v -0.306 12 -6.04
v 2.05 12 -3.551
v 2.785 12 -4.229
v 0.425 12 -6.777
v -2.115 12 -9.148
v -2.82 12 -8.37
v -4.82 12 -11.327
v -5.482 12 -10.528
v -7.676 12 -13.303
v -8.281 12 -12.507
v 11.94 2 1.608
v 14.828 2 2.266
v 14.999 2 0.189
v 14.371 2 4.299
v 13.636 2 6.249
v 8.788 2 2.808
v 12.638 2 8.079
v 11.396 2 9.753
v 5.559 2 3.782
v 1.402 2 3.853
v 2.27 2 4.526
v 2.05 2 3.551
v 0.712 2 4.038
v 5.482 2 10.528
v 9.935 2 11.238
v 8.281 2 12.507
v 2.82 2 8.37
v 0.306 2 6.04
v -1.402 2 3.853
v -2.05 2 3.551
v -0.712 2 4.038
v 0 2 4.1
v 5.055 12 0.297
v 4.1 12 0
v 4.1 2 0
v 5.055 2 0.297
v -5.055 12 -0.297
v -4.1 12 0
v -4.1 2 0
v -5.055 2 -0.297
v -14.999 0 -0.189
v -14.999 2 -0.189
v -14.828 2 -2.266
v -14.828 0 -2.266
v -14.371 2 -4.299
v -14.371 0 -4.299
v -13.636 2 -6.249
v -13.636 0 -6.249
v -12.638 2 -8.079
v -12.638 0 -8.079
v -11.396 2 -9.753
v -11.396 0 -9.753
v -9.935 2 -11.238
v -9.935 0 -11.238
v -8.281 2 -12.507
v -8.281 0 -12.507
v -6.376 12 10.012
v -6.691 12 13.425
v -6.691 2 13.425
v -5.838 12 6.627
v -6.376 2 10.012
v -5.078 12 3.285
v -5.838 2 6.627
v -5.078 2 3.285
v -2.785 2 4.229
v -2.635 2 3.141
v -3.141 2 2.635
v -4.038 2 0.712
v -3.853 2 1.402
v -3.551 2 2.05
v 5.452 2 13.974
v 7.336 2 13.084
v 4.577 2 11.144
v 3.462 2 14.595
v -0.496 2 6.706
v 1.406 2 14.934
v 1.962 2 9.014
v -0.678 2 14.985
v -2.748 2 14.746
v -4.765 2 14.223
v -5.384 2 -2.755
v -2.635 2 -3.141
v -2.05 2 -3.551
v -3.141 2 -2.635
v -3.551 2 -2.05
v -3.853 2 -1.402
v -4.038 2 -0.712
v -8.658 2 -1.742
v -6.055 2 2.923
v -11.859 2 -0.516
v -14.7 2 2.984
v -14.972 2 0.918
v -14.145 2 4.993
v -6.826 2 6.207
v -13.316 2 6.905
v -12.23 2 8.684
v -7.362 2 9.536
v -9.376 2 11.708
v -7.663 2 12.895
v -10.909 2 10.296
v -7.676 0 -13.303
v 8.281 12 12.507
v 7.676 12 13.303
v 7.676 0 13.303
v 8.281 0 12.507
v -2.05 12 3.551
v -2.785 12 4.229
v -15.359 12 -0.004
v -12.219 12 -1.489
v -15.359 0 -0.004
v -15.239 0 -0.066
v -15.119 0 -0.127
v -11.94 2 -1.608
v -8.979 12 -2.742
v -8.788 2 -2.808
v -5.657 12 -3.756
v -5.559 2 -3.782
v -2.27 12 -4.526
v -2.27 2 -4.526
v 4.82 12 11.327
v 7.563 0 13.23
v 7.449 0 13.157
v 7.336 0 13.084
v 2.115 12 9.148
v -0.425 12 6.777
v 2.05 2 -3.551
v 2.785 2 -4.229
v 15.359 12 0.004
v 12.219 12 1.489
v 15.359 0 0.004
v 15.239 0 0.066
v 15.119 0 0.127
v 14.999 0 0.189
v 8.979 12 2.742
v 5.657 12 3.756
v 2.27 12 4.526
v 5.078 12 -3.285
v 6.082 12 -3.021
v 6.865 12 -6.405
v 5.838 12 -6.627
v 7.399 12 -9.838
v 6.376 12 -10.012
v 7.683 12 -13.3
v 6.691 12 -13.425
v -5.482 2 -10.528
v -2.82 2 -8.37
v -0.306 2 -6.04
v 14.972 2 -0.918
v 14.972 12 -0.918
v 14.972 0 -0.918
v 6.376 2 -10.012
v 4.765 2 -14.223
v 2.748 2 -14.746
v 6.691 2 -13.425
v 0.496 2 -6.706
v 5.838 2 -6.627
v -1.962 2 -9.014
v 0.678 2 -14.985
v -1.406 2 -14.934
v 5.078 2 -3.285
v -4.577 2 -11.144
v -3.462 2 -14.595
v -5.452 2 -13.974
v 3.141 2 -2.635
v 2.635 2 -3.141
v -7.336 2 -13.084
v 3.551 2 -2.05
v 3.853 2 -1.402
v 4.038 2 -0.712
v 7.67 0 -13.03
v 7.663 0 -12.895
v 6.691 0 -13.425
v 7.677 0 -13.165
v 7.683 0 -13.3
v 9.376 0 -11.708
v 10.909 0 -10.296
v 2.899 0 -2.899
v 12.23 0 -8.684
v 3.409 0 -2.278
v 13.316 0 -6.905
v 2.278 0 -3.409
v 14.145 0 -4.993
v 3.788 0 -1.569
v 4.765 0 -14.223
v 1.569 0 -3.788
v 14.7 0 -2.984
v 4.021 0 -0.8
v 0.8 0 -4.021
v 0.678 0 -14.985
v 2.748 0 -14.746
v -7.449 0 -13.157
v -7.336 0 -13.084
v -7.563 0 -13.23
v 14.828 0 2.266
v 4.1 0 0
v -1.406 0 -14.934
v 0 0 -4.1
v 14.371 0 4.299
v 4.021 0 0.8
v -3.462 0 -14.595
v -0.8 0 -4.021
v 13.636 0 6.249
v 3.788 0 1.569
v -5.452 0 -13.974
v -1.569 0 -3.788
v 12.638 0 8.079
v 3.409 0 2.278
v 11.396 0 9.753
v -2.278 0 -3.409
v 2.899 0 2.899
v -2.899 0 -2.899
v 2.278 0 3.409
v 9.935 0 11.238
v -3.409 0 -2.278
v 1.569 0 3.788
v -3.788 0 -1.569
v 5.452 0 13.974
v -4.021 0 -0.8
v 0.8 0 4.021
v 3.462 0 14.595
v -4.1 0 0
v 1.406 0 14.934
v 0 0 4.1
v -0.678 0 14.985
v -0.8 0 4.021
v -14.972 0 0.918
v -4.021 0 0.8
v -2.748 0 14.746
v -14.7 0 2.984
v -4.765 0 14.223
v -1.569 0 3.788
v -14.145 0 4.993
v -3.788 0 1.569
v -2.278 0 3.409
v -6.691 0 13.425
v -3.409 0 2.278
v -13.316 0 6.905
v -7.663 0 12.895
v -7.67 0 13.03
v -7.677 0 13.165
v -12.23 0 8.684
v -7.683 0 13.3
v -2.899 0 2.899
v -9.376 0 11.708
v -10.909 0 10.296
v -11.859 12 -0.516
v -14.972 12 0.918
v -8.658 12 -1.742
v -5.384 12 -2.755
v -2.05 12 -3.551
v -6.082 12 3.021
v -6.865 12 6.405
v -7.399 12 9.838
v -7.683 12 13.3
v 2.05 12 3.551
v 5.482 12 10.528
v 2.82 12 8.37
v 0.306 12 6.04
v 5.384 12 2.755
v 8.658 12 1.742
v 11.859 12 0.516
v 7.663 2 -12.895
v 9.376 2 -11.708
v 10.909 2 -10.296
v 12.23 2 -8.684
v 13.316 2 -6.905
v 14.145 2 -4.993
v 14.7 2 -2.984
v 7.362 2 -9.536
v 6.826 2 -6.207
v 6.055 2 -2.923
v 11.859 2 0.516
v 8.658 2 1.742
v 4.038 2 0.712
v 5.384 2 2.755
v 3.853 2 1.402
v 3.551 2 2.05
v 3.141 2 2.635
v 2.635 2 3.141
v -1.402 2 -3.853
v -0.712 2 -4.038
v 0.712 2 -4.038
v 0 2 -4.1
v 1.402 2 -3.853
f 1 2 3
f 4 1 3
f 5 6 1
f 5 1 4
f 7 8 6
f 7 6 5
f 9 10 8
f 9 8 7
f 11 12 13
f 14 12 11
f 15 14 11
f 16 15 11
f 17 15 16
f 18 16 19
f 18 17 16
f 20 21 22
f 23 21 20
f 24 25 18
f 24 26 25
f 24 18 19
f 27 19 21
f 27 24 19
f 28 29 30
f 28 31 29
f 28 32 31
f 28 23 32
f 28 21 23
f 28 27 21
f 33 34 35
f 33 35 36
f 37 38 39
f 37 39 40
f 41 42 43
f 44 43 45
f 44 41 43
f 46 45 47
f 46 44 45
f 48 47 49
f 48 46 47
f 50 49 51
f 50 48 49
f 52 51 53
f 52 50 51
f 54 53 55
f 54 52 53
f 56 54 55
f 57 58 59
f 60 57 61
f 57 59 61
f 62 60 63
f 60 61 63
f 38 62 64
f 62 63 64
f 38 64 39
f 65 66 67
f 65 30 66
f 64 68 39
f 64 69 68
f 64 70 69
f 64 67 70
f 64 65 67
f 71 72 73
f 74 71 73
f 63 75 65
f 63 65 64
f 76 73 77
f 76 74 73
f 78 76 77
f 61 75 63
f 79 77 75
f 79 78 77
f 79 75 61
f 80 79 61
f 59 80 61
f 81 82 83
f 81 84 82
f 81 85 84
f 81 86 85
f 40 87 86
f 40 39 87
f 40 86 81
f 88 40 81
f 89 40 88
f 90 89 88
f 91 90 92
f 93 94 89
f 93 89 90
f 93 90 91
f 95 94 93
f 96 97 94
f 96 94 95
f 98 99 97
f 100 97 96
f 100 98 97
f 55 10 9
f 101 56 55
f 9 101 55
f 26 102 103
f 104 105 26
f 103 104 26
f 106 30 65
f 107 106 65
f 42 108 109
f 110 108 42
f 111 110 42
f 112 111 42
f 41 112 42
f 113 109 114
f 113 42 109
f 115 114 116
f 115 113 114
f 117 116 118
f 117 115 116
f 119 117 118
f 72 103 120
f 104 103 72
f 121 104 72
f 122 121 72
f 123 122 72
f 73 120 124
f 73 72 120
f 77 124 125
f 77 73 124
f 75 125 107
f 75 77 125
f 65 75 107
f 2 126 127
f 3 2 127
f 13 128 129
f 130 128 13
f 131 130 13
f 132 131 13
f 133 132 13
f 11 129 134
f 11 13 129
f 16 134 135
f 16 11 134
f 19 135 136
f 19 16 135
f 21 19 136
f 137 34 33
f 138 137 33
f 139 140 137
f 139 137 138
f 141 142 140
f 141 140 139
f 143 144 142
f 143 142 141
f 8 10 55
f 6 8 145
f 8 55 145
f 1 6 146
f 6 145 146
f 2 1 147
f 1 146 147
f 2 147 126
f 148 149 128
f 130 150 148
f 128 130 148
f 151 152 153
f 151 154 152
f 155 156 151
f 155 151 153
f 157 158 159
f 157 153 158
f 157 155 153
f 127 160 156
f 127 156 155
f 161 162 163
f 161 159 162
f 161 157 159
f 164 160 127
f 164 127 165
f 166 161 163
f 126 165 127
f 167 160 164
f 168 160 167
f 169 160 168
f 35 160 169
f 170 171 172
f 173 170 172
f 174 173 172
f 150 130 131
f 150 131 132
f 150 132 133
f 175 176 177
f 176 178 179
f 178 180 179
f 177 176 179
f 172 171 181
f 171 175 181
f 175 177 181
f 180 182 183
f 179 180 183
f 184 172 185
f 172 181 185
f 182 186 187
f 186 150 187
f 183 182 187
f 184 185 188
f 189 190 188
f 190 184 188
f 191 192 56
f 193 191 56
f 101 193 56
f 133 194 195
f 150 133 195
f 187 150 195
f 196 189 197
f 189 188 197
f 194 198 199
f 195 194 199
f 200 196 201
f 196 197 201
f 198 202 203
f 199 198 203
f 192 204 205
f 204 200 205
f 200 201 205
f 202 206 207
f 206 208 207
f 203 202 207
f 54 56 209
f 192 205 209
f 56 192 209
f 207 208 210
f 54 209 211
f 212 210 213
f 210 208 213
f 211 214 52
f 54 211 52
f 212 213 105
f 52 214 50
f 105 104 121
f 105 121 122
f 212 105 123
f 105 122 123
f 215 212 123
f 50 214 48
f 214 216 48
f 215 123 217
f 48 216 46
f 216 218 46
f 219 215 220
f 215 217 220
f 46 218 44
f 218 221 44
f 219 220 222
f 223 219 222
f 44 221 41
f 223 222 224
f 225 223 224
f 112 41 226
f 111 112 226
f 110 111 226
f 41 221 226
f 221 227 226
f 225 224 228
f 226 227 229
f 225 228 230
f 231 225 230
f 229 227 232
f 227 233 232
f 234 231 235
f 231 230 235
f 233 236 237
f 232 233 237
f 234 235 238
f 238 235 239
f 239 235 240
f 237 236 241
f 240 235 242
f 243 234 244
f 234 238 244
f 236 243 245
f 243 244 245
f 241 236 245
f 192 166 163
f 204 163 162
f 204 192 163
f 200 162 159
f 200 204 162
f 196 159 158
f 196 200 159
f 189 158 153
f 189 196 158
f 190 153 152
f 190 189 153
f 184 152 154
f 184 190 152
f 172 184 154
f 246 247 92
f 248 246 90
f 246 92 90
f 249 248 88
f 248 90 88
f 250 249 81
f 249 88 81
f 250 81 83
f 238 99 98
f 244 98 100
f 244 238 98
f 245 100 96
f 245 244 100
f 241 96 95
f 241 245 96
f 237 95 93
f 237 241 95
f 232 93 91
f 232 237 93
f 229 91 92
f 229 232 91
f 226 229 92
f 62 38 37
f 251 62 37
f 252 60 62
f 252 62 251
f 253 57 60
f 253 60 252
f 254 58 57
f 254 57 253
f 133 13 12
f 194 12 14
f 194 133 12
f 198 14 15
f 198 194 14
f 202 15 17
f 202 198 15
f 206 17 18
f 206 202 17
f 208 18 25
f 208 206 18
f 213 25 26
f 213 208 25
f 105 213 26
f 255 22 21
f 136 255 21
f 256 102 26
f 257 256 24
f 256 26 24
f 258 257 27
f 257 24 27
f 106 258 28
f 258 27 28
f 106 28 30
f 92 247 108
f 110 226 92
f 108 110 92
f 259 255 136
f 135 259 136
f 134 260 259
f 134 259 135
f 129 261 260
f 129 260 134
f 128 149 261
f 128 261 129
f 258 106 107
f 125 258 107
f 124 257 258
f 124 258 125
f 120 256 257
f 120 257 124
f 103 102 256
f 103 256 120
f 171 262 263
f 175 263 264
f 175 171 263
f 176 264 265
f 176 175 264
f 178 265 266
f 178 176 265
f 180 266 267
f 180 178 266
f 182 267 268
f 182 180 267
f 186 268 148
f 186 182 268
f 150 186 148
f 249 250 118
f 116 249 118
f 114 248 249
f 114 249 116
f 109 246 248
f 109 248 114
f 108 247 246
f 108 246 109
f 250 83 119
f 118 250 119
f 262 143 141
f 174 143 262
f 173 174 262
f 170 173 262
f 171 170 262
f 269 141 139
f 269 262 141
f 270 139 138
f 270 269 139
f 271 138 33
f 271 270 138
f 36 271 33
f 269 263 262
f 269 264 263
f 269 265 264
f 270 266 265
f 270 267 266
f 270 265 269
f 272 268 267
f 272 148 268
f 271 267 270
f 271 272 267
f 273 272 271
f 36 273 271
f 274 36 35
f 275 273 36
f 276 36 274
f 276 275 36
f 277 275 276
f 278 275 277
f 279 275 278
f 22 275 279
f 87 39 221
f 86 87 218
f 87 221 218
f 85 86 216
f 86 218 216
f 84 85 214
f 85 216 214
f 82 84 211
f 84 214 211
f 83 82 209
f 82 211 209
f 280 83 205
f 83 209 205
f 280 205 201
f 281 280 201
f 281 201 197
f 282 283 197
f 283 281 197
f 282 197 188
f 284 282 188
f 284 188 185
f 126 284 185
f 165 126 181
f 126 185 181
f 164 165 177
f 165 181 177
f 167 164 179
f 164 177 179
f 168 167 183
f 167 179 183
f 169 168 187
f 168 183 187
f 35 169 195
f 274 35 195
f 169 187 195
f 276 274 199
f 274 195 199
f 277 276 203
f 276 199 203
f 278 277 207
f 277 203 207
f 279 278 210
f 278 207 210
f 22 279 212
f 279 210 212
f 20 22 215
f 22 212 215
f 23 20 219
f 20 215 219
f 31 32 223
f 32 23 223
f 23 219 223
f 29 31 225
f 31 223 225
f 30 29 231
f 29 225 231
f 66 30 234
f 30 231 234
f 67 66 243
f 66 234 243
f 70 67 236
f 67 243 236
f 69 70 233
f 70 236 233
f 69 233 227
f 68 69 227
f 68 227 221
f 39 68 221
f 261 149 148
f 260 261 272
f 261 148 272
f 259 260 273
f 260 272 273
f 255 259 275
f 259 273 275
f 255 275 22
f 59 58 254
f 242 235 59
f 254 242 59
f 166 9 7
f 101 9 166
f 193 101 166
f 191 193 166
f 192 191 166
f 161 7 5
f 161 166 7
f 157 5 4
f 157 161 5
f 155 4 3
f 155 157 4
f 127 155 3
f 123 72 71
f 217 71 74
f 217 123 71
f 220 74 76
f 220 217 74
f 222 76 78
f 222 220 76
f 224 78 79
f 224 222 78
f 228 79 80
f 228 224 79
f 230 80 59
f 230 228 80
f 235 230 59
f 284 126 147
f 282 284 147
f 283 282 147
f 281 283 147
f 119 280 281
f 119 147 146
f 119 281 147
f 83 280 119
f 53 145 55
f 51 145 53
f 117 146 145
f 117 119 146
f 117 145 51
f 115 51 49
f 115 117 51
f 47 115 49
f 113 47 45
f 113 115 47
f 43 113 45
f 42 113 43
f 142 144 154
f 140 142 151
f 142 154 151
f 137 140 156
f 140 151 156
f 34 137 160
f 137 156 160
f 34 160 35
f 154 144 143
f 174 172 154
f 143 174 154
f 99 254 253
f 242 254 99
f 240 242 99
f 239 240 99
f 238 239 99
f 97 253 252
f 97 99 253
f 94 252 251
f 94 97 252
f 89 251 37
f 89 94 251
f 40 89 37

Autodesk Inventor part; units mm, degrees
ref_plane "YZ Plane" through (0, 0, 0) normal (1, 0, 0) x (0, 1, 0)
ref_plane "XZ Plane" through (0, 0, 0) normal (0, 1, 0) x (-1, 0, 0)
ref_plane "XY Plane" through (0, 0, 0) normal (0, 0, 1) x (1, 0, 0)
sketch "Sketch1" plane through (0, 0, 0) normal (0, 1, 0) x (-1, 0, 0)
  circle A0 centre (0, 0) radius 15
  circle A1 centre (0, 0) radius 4.1
  arc A2 (4.1, 0) -> (6.6908, 13.4251) centre (-45.2629, 16.4886) ccw
  line L0 (4.1, 0) -> (5.0548, -0.2974)
  line L1 (6.6908, 13.4251) -> (7.6829, 13.2996)
  arc A3 (5.0548, -0.2974) -> (7.6829, 13.2996) centre (-40.0035, 15.4643) ccw
  dimension "d0" = 30
  dimension "d1" = 8.2
  dimension "d10" = 1
  dimension "d11" = 1
extrude "Extrusion1" add sketch "Sketch1" along normal blind 2 contours A2 L0 A3 A0 | A0 A3 L0 A2
extrude "Extrusion3" add sketch "Sketch1" along normal blind 12 contours L1 A3 A0 | A0 A3 L0 A2 picked at (6.2625, 7.2317)
pattern_circular "Circular Pattern2" count 6 over 360 about axis through (0, 0, 0) along (0, 1, 0) of "Extrusion3"
equation "\"d0\" = PropDiameter"
equation "\"d1\" = PropHoleDiameter"
equation "\"d10\" = PropBladeThickness"
equation "\"d11\" = PropBladeThickness"
equation "\"d2\" = PropPlateThickness"
equation "\"d12\" = PropPlateThickness + PropDepth"
equation "\"PropHoleDiameter\" = 8.2"
equation "\"PropDepth\" = 10"
equation "\"PropPlateThickness\" = 2"
equation "\"PropBladeThickness\" = 1"
equation "\"VoluteCaseInnerSize\" = 31"
equation "\"VoluteCaseOuterSize\" = 42"
equation "\"VoluteWallThickness\" = 2"
equation "\"VoluteStartAngle\" = 25deg"
equation "\"PropDiameter\" = 30"
properties part number "Propeller"
